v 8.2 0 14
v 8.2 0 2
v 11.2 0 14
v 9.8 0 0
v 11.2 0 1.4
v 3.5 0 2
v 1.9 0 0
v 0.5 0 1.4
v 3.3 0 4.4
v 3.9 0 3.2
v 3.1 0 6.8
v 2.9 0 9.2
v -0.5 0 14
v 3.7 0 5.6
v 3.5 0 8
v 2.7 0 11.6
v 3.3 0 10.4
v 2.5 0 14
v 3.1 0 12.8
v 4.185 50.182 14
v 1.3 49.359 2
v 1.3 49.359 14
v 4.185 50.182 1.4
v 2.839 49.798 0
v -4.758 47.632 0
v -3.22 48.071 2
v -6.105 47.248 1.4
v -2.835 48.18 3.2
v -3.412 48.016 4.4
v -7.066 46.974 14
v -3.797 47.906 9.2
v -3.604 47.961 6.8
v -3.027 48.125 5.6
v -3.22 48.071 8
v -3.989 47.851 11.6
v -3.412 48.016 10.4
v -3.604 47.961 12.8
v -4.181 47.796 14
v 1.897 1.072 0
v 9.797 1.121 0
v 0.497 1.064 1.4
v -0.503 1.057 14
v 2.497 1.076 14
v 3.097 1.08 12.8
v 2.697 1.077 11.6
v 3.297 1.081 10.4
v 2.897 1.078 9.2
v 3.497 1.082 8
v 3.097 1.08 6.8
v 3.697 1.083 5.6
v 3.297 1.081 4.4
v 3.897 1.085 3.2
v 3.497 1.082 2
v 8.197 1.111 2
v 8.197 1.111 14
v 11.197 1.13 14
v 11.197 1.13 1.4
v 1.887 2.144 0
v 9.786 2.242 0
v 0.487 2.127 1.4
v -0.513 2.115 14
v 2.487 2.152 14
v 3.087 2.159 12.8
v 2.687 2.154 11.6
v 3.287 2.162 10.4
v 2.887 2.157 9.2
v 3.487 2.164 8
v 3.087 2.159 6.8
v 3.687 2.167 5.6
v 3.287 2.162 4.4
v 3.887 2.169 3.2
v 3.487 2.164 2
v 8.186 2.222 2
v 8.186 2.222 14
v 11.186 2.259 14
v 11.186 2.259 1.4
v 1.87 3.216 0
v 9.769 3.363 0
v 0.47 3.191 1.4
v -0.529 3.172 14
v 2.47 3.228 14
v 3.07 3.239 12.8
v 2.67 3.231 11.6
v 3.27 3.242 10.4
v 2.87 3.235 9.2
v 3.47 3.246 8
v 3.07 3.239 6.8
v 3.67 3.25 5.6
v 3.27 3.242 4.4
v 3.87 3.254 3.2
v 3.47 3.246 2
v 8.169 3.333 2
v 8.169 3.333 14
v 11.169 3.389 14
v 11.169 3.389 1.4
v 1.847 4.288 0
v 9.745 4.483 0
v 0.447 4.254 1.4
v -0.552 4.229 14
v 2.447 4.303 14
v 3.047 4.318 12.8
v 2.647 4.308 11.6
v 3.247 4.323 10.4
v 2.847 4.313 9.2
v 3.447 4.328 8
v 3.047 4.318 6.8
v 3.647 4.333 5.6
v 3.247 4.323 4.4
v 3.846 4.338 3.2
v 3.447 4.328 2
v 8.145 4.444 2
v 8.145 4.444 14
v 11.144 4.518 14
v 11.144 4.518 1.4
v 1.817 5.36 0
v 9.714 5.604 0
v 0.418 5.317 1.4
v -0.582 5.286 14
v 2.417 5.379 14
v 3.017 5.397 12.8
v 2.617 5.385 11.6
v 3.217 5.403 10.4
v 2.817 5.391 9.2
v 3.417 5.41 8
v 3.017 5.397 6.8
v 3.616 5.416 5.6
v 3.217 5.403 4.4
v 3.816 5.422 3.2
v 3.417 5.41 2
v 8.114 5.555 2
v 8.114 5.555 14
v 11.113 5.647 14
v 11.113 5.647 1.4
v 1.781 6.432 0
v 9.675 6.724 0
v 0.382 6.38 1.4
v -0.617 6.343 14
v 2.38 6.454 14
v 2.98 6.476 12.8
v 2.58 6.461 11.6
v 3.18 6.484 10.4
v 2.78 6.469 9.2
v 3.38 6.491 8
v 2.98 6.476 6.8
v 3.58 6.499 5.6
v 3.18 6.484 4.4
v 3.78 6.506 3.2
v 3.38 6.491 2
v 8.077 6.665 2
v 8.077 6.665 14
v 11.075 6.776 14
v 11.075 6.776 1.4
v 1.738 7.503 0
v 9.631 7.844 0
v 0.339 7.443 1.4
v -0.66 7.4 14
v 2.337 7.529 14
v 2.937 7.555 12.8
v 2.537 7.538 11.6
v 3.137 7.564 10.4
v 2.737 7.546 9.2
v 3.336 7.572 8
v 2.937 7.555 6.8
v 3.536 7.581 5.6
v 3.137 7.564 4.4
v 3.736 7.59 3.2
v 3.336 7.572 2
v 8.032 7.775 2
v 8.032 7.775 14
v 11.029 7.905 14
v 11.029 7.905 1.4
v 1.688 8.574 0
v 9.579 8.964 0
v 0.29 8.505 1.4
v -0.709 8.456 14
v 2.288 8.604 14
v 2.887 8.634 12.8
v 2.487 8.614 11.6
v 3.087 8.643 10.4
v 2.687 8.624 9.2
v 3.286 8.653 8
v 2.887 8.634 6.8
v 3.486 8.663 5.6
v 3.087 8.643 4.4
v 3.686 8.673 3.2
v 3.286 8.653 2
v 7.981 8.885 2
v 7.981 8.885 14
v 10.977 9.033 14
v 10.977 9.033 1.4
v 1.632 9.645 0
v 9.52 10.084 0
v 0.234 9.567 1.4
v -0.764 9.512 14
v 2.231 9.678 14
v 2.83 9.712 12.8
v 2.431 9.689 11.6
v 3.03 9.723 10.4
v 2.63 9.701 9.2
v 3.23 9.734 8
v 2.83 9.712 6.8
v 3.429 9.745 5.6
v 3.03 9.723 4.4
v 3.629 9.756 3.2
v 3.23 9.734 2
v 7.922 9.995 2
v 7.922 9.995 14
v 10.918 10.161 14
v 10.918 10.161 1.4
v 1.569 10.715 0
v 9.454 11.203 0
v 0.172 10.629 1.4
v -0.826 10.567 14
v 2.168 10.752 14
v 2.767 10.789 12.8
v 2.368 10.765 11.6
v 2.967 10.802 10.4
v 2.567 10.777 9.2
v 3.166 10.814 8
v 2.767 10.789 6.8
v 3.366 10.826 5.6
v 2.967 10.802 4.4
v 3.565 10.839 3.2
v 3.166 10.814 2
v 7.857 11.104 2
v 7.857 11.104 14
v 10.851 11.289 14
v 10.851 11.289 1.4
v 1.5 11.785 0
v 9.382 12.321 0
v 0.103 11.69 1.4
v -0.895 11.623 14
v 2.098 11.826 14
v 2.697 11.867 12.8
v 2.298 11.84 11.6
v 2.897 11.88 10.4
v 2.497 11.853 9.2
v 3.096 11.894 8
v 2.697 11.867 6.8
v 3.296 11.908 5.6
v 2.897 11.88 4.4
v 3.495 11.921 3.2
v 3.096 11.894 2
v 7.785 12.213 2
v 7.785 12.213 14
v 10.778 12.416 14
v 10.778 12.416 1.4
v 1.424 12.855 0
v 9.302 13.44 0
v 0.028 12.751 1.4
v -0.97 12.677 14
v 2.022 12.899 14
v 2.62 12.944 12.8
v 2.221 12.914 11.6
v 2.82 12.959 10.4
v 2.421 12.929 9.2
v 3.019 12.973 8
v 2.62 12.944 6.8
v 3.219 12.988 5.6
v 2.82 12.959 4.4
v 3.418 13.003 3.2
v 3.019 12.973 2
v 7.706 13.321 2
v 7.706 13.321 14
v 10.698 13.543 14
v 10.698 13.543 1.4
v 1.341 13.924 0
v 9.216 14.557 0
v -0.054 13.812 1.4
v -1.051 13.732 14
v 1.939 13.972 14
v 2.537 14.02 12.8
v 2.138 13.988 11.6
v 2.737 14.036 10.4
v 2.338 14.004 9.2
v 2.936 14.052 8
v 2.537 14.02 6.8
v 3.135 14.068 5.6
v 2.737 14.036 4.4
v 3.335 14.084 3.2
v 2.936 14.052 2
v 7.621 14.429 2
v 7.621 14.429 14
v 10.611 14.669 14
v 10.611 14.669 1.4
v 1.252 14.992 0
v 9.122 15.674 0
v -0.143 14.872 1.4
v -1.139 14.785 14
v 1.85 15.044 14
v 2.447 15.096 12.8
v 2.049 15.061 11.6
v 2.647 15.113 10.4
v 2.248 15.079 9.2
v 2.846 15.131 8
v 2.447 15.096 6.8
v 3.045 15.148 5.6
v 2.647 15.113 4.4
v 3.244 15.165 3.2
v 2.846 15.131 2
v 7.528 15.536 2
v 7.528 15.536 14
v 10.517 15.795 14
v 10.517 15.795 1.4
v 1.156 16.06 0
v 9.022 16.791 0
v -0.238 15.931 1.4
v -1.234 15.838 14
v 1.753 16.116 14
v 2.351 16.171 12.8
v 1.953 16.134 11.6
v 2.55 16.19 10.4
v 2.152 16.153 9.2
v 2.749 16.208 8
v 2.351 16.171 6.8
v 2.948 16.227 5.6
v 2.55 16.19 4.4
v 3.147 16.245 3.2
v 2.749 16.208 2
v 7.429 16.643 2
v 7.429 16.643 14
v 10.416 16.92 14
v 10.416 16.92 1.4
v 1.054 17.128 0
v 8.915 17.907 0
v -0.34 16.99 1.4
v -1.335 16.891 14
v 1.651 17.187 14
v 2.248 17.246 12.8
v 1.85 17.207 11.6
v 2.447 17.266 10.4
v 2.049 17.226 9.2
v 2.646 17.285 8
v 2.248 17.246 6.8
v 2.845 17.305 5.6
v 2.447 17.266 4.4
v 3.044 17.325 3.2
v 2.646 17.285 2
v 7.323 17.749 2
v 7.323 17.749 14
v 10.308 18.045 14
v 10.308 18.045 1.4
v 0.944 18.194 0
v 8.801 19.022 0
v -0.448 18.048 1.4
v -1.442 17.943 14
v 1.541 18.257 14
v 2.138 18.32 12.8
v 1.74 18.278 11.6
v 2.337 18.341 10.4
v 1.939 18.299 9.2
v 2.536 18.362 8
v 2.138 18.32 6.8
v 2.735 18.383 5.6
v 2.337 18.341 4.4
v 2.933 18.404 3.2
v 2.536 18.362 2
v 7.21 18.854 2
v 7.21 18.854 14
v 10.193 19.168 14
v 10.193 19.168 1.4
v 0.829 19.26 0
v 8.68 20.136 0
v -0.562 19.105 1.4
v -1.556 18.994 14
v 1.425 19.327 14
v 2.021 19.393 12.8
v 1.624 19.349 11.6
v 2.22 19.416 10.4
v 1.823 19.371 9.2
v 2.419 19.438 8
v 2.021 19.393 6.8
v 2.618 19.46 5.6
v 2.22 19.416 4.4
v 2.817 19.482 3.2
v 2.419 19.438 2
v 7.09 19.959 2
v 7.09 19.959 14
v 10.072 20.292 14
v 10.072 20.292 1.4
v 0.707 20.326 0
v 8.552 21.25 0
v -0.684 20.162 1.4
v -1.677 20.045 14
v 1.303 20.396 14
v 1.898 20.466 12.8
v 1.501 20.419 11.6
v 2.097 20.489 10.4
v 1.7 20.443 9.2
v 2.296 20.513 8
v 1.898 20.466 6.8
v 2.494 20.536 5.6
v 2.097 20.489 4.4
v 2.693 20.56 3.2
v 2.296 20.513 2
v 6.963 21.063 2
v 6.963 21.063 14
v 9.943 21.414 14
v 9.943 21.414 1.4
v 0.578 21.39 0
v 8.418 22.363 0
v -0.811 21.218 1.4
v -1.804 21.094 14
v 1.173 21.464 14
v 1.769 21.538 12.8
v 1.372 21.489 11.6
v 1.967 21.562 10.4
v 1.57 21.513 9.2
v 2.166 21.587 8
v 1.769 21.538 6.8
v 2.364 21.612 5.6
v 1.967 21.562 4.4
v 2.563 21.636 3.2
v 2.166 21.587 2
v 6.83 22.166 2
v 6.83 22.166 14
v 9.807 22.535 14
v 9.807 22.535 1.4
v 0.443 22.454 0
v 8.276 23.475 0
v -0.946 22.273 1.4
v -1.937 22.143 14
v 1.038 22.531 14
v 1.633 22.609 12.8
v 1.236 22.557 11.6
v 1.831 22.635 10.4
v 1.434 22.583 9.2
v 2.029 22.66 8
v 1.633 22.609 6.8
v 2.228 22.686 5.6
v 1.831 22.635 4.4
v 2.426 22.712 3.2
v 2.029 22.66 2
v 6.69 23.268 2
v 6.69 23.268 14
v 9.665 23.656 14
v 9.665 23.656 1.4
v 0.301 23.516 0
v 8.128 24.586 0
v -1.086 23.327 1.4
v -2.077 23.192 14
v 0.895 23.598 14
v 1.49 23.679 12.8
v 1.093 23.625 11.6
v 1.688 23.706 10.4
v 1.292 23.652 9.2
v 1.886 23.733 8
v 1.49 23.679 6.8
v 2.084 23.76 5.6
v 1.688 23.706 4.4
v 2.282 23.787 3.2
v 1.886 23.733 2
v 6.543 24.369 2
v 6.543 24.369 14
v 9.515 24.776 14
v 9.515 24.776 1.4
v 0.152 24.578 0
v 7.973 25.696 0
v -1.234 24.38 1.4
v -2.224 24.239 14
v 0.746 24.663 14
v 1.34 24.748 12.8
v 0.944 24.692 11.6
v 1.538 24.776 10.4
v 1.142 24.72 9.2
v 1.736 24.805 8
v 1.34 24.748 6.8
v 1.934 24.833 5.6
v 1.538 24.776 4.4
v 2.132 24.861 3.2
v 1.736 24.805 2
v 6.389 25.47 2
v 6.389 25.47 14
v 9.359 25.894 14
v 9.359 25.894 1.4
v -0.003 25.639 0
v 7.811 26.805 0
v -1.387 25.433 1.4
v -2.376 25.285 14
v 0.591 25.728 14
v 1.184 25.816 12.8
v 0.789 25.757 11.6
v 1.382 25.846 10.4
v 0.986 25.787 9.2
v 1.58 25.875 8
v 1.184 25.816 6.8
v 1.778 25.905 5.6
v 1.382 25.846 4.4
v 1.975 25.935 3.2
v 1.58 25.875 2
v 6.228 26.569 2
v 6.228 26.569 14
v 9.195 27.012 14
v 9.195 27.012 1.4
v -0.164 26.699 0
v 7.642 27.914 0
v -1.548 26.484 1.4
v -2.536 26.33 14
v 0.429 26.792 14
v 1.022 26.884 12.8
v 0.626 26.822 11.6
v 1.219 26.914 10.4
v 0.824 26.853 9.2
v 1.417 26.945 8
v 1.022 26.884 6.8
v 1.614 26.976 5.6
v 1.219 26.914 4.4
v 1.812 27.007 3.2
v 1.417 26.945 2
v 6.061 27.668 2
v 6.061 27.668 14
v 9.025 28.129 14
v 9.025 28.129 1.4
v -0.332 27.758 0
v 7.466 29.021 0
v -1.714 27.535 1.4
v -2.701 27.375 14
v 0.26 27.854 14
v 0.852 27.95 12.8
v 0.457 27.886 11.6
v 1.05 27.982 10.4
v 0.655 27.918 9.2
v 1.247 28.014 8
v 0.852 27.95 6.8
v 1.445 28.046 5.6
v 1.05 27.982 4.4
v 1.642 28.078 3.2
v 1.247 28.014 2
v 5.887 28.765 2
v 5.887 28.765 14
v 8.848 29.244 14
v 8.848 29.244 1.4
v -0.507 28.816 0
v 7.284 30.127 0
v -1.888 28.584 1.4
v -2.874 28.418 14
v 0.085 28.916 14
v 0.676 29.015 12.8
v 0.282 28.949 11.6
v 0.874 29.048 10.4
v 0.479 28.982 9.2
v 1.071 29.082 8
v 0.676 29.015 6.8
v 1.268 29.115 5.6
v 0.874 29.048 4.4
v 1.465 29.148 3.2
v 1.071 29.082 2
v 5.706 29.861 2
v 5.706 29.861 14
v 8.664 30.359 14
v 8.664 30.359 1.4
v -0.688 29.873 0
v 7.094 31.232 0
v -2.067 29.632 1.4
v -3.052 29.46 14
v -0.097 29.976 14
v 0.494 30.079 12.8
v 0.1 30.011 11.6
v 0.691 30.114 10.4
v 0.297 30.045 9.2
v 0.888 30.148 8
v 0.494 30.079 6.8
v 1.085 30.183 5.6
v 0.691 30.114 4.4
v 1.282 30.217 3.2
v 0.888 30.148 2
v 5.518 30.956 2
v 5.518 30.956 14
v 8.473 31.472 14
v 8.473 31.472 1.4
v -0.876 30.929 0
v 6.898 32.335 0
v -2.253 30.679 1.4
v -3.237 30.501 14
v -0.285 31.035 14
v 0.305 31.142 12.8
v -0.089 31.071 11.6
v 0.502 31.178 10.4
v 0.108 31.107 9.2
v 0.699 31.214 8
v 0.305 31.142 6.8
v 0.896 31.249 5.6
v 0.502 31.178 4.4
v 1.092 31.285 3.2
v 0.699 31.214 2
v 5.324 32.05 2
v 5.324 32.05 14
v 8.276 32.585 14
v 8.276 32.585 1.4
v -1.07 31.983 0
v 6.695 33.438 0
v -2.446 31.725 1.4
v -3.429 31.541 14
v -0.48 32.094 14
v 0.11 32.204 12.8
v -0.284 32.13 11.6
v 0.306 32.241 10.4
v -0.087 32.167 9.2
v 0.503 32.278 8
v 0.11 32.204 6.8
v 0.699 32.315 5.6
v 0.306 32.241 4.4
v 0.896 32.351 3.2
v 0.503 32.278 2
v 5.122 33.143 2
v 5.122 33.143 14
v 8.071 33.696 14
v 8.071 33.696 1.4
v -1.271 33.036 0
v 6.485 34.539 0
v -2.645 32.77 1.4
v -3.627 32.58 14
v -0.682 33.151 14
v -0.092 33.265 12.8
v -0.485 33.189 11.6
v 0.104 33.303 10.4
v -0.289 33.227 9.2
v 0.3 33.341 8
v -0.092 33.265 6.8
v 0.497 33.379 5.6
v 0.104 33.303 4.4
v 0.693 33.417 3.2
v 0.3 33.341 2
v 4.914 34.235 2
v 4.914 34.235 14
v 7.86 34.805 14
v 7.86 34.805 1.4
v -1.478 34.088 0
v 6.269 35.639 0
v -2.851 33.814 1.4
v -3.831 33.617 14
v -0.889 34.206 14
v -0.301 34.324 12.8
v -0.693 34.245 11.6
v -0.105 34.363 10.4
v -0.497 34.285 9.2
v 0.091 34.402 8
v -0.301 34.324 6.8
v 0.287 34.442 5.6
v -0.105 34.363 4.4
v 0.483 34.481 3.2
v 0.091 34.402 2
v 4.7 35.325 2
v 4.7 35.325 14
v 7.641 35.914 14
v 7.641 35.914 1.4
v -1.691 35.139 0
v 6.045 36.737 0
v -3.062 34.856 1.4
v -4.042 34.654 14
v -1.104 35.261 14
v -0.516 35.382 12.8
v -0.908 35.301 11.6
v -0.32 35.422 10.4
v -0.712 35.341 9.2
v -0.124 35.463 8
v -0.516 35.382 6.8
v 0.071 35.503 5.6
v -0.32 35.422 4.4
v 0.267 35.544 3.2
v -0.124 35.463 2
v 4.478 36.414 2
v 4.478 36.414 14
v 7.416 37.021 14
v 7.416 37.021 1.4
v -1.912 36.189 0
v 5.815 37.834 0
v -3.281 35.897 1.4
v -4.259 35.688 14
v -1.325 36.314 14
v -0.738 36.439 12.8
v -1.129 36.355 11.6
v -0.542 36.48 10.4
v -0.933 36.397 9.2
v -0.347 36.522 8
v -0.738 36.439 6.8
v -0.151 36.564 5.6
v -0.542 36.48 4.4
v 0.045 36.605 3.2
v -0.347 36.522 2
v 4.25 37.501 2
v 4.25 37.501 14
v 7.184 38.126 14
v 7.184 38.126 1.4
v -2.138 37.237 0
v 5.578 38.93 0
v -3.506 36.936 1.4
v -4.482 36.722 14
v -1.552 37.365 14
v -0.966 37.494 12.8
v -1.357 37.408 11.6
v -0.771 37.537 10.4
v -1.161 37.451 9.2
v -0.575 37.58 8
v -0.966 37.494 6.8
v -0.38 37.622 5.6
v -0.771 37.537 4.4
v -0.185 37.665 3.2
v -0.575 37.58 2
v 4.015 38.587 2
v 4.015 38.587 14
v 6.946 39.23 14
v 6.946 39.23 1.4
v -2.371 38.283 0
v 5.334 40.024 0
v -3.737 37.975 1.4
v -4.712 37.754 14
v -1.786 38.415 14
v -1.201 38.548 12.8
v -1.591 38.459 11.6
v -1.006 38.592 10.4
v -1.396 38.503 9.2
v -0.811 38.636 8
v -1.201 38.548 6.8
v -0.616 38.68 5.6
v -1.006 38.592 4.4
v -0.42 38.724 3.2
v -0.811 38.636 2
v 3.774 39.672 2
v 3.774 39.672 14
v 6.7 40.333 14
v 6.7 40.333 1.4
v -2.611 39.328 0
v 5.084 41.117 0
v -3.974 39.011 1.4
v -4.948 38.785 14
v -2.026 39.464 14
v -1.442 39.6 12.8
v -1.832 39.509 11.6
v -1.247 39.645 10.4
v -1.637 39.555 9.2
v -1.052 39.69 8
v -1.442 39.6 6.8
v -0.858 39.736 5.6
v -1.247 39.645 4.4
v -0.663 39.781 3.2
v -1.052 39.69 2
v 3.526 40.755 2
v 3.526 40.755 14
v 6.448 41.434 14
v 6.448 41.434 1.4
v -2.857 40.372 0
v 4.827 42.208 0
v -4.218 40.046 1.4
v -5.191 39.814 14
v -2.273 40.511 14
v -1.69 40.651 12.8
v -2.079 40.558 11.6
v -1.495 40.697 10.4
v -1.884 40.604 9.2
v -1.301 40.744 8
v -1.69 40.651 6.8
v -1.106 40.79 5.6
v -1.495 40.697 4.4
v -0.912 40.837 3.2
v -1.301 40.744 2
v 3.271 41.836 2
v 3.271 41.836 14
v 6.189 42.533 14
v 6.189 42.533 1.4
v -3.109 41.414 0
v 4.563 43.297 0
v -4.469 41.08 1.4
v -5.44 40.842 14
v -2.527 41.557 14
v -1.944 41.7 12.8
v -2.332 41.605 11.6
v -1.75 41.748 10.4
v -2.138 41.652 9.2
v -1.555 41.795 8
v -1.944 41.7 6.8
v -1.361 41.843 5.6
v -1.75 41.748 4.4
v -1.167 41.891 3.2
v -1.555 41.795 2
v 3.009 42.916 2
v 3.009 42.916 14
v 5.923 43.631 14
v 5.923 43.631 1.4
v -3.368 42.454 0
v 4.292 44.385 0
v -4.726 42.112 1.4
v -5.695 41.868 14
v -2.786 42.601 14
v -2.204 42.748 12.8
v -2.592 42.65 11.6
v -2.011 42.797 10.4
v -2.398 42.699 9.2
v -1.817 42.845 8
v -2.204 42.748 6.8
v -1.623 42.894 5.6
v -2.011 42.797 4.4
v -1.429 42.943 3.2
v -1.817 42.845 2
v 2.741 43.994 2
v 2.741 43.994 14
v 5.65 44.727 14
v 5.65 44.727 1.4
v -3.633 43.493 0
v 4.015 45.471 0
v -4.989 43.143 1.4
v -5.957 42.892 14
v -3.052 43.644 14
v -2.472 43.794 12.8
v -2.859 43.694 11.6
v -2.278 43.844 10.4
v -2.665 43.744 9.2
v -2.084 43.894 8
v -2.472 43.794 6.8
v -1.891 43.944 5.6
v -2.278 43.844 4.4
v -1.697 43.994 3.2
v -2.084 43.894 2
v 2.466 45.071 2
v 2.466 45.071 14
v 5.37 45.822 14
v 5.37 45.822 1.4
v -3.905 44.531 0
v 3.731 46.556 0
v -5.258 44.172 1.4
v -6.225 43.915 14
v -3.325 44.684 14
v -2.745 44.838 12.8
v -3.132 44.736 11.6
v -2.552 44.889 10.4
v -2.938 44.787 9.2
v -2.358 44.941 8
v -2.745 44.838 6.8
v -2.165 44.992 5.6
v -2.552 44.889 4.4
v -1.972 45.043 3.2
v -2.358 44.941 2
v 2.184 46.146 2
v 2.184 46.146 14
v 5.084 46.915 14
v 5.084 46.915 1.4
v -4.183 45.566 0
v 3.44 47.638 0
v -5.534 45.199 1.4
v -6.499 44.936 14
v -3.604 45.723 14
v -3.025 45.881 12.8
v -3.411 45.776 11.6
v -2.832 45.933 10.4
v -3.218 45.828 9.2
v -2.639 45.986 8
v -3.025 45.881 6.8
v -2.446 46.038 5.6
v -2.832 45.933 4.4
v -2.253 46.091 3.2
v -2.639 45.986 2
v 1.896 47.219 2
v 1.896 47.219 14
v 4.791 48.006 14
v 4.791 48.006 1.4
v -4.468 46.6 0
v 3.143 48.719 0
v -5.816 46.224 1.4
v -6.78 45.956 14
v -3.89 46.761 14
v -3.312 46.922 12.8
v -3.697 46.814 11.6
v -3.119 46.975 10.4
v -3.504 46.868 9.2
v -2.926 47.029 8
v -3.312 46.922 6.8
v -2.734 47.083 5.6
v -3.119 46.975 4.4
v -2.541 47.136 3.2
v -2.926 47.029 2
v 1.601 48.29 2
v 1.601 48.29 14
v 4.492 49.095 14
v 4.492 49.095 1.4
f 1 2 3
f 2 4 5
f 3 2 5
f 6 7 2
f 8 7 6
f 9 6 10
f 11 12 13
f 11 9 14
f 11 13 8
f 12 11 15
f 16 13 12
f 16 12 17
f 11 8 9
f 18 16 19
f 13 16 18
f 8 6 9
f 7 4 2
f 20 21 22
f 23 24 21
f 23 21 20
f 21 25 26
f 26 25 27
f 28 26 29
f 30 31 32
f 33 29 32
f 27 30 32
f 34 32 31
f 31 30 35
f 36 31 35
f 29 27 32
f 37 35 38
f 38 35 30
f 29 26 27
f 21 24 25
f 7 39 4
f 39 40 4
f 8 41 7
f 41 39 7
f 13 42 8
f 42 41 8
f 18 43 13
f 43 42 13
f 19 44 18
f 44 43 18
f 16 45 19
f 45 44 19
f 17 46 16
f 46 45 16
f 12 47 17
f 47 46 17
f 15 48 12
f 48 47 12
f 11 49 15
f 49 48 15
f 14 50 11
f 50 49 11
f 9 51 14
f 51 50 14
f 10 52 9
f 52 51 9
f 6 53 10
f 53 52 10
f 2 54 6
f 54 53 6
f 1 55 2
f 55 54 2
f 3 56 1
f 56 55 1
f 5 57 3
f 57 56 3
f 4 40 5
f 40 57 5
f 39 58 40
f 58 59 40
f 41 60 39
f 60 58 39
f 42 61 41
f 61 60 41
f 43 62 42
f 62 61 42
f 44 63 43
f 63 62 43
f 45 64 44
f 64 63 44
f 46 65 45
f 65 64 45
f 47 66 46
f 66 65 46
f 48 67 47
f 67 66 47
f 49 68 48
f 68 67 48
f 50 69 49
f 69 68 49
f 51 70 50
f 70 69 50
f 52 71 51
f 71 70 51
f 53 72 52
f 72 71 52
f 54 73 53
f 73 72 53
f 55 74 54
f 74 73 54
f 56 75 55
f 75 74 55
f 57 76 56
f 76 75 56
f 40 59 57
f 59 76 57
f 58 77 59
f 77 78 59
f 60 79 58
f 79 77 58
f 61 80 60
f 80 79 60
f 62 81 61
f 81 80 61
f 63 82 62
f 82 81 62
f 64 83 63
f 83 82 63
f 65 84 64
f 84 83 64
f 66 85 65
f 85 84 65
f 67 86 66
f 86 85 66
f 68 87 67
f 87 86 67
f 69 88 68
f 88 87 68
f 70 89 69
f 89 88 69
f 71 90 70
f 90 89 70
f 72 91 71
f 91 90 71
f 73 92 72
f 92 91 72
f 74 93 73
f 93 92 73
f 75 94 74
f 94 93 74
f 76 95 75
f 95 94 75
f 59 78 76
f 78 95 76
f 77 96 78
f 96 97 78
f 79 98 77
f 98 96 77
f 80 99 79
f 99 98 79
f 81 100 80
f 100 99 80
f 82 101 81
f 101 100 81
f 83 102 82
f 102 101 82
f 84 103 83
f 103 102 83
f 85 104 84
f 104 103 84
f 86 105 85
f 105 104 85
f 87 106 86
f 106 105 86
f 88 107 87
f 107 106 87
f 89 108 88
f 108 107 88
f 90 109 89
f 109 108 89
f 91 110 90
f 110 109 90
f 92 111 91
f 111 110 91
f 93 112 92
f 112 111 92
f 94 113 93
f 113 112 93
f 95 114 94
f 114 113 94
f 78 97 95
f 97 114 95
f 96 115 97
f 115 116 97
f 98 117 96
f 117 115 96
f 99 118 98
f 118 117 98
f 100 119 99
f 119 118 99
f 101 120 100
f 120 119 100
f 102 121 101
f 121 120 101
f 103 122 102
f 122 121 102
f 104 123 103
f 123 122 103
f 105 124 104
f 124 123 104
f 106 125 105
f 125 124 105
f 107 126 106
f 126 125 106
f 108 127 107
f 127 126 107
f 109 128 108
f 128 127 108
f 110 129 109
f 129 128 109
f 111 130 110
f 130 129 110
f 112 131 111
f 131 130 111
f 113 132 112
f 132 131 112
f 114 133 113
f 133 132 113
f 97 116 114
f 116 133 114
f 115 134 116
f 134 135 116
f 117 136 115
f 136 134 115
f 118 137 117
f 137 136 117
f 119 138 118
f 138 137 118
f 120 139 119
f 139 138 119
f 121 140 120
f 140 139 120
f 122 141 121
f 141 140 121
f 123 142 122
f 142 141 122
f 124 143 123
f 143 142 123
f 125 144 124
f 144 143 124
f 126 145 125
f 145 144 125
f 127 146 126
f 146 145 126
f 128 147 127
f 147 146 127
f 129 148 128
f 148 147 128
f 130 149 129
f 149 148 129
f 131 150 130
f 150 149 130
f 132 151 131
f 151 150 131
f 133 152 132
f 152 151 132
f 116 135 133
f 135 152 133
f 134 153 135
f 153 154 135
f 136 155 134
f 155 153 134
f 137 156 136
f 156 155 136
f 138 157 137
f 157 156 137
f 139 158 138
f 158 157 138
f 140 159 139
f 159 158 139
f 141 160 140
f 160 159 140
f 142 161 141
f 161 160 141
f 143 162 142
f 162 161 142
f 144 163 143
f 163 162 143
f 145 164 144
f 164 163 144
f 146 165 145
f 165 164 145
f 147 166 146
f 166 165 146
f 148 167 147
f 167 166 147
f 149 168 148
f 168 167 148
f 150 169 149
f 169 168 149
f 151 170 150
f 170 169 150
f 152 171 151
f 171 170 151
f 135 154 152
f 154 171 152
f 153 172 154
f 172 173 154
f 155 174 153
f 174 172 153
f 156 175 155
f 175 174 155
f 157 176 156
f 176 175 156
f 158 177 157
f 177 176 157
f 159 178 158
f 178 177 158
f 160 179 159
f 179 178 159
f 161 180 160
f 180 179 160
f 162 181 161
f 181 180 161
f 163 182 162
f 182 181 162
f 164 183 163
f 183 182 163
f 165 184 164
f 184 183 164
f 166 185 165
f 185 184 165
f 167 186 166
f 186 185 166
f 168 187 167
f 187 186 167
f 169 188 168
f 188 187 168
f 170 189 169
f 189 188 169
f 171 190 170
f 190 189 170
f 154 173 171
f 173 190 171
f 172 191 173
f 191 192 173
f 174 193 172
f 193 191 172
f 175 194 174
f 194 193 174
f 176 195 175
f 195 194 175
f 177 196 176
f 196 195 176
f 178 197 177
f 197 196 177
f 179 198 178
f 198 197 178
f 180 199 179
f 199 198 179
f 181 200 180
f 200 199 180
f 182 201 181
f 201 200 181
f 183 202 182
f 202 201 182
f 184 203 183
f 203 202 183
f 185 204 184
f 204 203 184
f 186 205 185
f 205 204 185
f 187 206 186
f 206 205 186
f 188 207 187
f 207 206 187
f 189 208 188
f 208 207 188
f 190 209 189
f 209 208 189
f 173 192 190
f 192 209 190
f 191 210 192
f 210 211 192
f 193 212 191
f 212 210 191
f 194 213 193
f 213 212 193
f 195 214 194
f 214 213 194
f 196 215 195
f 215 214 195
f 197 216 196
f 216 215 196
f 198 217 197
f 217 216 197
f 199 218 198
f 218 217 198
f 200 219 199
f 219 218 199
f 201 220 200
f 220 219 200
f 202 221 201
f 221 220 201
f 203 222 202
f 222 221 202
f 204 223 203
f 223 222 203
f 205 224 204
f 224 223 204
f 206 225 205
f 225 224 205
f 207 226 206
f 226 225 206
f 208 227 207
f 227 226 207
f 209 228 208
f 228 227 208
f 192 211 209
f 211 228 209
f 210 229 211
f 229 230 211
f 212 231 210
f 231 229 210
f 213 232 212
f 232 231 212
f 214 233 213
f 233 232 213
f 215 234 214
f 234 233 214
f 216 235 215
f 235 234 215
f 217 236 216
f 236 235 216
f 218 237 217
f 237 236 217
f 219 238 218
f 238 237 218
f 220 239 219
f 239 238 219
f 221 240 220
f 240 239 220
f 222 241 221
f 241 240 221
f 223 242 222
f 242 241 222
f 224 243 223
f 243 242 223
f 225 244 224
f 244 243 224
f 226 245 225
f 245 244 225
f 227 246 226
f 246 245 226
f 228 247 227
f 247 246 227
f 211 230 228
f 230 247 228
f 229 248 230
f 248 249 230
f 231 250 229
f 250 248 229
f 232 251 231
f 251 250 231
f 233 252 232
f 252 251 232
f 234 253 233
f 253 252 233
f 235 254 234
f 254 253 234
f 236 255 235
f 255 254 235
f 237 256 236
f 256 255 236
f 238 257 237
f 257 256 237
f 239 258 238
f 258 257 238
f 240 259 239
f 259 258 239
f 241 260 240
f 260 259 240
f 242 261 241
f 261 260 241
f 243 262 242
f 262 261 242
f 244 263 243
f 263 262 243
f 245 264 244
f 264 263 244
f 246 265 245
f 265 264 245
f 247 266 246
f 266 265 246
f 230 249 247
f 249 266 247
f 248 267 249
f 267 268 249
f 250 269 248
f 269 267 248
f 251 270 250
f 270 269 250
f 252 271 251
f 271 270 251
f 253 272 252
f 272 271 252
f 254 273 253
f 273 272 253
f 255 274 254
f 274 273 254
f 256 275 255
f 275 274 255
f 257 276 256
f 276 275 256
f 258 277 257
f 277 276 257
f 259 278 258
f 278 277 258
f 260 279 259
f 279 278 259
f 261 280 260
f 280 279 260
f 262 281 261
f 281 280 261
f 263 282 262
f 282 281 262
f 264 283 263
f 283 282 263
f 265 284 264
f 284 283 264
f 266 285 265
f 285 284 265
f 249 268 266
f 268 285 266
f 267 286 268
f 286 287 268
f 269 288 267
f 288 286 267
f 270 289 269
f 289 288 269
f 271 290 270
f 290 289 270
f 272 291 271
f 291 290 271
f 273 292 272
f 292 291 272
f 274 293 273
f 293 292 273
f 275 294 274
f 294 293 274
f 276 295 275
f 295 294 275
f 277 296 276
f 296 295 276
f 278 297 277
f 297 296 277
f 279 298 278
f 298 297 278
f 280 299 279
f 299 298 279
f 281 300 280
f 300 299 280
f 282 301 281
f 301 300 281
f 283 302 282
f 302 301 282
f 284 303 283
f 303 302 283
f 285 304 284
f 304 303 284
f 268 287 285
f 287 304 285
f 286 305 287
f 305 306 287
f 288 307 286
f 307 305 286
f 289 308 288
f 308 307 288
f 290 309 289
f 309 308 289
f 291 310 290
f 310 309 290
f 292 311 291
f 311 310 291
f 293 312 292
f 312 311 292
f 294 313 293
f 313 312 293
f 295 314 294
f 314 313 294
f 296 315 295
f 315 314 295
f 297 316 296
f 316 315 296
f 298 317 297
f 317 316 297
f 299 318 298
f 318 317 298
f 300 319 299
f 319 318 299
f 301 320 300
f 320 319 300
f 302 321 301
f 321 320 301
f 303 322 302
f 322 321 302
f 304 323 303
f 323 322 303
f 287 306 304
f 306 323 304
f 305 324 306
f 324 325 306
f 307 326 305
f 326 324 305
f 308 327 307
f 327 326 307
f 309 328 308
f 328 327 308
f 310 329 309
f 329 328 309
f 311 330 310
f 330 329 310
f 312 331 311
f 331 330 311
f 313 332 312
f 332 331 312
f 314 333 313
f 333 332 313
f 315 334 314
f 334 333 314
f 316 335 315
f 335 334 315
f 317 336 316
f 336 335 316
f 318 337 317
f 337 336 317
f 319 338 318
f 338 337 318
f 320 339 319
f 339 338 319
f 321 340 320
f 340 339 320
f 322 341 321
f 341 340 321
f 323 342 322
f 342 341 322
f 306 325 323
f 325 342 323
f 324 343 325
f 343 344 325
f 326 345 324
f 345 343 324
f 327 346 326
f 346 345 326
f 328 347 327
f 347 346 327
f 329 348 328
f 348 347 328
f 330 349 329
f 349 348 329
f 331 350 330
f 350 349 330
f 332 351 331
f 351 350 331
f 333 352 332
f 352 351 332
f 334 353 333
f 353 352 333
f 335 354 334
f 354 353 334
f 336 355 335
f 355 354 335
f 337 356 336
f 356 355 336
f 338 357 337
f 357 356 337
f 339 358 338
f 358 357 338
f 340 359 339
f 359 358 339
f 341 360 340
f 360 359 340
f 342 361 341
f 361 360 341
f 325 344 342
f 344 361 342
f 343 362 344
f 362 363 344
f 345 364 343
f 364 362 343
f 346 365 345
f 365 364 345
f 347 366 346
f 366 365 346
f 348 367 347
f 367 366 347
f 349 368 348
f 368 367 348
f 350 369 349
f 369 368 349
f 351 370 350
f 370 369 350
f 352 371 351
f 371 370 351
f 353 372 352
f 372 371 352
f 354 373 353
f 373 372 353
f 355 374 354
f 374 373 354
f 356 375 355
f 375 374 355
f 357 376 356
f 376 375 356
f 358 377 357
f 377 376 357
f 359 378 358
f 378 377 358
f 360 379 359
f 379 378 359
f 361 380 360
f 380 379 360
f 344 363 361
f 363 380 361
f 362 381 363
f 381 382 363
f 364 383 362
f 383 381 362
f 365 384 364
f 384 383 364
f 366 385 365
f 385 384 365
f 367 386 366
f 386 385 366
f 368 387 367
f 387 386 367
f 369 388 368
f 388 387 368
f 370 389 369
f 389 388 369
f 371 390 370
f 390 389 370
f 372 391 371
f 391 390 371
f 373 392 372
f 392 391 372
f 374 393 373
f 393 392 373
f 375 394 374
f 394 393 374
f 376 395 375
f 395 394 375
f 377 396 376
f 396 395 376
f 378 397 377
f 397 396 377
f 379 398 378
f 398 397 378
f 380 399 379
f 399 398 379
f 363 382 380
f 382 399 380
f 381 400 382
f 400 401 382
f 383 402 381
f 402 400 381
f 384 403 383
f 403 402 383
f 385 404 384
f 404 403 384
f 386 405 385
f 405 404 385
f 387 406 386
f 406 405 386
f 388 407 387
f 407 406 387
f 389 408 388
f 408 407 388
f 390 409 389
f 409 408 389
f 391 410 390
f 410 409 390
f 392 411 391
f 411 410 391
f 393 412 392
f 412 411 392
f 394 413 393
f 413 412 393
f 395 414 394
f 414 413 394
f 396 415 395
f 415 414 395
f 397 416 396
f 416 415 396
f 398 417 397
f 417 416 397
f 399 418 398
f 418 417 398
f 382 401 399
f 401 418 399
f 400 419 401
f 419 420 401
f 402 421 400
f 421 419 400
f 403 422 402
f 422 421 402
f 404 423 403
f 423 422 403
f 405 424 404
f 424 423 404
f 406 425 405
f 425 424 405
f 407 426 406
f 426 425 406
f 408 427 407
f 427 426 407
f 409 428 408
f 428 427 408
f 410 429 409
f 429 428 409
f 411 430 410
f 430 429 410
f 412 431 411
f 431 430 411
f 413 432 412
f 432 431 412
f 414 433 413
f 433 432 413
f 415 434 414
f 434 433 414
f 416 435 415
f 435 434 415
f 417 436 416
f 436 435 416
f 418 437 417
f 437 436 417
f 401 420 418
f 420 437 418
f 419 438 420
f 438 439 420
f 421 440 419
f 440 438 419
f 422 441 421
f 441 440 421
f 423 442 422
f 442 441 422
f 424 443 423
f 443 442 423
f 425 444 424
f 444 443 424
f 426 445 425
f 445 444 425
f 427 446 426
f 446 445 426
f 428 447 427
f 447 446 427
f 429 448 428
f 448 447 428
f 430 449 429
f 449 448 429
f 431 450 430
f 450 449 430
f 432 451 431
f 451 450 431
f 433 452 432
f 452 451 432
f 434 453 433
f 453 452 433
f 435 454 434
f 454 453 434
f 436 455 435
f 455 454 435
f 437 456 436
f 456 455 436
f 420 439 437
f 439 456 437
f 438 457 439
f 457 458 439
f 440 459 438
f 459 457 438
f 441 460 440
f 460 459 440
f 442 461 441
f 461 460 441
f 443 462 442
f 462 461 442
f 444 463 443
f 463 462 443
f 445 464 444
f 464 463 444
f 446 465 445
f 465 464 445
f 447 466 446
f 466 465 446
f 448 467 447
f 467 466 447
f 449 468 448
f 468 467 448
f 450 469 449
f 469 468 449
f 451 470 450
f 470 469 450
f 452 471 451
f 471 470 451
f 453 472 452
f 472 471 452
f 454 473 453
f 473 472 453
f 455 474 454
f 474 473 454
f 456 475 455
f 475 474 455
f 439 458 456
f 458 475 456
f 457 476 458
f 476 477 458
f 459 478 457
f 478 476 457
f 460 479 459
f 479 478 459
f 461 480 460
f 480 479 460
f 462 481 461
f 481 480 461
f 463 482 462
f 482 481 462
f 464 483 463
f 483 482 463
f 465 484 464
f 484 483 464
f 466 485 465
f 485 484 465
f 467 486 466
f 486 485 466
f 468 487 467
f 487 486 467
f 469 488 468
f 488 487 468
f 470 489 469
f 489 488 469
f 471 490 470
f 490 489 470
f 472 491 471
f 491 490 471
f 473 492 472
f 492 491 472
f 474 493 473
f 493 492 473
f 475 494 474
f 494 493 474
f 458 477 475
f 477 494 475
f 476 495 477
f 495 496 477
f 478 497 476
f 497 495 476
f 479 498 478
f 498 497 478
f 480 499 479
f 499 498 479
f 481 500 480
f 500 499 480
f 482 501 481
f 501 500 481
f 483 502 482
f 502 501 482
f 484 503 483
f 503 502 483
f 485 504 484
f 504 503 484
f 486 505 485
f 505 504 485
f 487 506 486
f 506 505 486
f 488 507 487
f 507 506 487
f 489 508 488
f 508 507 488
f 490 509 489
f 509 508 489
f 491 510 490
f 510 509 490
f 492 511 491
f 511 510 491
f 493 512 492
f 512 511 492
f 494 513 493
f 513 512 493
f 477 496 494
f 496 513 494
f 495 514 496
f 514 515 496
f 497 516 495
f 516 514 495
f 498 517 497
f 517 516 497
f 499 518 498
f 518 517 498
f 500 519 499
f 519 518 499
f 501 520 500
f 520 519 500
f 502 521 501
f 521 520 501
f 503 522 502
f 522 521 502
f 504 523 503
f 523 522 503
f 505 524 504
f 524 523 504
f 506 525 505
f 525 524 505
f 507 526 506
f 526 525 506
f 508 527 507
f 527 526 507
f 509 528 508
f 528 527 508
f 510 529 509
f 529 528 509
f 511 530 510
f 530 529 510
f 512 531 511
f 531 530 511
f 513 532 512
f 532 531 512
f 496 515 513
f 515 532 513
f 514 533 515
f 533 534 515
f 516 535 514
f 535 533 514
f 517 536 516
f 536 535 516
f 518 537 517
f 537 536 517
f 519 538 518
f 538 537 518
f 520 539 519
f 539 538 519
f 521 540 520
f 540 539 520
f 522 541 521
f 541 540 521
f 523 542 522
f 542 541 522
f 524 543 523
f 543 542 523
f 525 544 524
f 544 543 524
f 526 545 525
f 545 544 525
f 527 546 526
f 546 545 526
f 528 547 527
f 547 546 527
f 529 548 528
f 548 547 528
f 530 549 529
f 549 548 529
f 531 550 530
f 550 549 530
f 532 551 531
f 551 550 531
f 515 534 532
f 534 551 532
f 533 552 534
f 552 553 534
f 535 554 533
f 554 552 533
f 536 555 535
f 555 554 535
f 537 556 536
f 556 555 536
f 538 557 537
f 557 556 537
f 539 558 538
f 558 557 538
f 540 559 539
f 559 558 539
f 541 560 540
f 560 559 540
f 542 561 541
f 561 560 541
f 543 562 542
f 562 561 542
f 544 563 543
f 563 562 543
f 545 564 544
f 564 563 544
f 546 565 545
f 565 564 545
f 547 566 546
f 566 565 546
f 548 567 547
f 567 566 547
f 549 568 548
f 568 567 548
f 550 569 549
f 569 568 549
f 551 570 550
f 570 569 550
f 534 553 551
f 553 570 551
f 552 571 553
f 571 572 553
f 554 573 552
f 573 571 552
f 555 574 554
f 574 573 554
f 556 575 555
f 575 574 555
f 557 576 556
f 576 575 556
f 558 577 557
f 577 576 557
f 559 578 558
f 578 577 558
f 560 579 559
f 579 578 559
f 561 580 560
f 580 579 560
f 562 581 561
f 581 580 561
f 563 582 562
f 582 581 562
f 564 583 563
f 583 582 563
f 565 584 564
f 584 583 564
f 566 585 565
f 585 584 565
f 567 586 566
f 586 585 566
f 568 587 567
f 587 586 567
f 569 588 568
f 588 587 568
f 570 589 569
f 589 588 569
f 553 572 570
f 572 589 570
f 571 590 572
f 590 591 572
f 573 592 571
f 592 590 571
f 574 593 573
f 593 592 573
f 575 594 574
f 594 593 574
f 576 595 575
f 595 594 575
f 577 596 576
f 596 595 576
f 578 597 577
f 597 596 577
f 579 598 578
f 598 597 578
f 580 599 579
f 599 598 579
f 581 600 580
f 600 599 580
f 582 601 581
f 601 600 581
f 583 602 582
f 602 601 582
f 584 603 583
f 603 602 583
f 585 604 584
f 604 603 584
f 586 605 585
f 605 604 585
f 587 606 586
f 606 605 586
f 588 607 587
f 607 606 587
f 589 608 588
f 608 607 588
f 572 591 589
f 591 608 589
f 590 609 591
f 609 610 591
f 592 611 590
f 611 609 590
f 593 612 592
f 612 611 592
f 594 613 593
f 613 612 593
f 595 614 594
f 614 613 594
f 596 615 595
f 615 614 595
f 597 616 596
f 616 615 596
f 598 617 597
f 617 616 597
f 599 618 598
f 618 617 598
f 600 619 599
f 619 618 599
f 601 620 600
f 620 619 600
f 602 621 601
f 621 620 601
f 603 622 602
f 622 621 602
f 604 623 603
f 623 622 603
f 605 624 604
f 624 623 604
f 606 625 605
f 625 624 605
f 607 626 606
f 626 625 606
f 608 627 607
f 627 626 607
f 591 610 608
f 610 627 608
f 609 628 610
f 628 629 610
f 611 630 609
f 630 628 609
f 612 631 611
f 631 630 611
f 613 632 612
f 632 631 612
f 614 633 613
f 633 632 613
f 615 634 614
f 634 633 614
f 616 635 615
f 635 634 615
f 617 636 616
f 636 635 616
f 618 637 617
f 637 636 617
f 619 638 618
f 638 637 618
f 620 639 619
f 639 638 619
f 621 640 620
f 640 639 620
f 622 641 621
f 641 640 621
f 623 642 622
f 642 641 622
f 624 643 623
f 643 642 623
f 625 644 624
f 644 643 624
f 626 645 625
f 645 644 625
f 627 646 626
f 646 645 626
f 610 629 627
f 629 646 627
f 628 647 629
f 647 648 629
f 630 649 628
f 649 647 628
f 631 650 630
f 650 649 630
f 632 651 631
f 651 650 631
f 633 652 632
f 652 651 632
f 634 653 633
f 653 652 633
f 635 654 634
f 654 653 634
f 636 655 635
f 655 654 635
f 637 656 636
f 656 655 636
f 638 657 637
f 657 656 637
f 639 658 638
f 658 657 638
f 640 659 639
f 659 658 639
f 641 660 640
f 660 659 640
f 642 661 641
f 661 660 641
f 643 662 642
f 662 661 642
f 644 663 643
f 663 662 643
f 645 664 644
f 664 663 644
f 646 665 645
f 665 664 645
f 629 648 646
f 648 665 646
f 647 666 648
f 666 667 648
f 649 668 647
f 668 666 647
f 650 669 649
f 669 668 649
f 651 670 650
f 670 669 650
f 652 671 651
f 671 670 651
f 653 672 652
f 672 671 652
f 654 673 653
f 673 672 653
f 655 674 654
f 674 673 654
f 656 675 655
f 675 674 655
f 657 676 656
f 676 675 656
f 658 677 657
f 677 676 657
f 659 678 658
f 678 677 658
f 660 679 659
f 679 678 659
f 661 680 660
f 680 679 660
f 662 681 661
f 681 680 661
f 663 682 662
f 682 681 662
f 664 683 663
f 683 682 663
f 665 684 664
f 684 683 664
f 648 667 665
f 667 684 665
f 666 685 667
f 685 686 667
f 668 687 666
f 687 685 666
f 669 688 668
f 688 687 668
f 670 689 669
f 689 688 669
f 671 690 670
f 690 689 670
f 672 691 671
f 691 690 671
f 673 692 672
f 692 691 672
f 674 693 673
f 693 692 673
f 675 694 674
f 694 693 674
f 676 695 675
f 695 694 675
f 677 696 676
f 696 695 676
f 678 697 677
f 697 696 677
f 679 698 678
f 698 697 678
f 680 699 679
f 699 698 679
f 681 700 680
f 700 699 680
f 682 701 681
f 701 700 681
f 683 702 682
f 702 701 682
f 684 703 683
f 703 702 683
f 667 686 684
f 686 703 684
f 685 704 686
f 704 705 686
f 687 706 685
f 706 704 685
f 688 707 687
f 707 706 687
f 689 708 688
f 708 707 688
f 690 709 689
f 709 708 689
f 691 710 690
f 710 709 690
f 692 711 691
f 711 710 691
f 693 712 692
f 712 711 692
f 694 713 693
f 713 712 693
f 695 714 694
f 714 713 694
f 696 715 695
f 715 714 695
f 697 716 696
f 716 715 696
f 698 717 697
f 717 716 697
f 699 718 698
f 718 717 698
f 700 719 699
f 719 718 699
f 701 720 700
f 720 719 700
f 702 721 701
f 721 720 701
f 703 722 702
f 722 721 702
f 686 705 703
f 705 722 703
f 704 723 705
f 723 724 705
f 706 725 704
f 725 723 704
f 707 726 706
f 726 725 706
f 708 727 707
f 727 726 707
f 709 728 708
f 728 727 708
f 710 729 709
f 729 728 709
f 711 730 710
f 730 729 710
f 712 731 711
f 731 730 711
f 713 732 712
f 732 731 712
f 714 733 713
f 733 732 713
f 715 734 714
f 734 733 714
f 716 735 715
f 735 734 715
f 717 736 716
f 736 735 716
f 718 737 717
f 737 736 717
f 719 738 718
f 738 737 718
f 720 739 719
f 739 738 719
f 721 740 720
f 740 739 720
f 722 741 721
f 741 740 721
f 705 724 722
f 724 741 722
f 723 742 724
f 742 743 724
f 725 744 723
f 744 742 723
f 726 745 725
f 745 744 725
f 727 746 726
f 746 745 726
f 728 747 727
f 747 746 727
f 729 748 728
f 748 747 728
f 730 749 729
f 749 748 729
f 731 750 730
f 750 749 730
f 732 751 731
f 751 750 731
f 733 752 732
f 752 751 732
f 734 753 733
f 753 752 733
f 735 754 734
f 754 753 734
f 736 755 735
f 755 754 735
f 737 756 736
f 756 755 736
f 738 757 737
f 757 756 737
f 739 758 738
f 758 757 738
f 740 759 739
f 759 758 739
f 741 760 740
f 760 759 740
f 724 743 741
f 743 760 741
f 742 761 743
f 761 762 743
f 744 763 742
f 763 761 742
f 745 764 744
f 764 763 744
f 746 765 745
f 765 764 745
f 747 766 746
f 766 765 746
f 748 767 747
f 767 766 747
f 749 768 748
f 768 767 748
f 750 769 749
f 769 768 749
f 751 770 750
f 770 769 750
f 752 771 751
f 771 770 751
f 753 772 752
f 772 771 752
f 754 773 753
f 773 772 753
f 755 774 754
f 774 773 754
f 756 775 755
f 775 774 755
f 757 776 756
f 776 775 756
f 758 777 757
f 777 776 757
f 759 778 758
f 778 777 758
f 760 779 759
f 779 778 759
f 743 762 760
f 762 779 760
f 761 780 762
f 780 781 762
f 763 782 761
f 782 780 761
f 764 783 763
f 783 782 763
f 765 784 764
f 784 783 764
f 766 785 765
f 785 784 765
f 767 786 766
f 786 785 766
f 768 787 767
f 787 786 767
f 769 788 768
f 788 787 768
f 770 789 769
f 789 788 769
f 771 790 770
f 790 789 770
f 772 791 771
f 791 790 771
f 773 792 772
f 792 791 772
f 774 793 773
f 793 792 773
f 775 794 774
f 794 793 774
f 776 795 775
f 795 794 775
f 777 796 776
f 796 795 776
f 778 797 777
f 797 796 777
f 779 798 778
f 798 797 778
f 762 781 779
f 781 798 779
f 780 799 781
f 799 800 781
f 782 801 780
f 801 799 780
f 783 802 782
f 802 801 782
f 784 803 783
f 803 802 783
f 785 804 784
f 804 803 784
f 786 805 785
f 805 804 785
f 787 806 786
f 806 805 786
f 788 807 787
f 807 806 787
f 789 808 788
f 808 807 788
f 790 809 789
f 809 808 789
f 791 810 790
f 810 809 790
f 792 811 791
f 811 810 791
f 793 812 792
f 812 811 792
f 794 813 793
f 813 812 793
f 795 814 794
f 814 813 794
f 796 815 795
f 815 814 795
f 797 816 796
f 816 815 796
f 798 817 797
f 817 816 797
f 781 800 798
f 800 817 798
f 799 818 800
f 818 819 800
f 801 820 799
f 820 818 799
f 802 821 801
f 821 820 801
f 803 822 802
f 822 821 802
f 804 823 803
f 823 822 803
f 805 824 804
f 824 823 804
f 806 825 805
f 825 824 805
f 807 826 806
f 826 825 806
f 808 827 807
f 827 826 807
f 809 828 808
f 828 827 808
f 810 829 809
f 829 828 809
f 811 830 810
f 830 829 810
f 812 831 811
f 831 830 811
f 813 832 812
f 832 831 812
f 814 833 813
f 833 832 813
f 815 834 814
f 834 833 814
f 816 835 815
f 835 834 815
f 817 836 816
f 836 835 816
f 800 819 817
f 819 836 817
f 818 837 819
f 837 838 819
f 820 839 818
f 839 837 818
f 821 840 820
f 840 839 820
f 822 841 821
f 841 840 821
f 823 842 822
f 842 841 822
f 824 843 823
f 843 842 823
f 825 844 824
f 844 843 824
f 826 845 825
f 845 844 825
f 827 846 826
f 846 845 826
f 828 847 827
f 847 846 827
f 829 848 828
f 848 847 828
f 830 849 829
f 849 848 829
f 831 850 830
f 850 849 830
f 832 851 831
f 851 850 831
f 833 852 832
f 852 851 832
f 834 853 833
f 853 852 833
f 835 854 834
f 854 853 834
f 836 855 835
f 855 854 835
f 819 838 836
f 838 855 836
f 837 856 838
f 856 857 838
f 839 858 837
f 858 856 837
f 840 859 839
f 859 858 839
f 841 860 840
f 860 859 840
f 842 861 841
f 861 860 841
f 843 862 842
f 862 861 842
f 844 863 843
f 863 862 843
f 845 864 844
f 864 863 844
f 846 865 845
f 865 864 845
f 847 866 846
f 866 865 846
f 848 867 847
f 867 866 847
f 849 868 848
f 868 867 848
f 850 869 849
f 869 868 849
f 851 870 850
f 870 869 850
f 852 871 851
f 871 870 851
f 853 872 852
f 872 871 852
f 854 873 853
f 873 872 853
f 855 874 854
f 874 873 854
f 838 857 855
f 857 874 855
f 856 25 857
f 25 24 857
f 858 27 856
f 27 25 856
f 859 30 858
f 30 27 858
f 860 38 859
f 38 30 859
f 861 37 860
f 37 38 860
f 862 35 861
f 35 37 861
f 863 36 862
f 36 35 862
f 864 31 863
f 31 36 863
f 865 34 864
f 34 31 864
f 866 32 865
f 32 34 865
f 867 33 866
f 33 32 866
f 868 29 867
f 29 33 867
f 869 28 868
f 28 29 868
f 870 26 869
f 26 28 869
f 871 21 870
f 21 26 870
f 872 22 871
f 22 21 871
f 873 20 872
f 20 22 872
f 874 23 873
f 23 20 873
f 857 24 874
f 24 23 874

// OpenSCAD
$fn = 1024;

seat_r = 180;
upper_w = 5.2;
lower_w = 4.2;
clip_h = 14;
clip_bottom_w = 2;
clip_side_w = 3;
clip_l = 50;
bevel = 1.4;

teeth_overlap = 0.5;
teeth_count = 5;

angle = 360 / (2 * seat_r * PI / clip_l);

translate([-seat_r + upper_w + clip_side_w, 0, clip_h])
rotate_extrude(angle = angle)
    translate([seat_r + clip_side_w, 0, 0])
        rotate([180, 0, - 90])
            clip_profile();

module clip_profile() {
    outer_x = clip_h;
    inner_x = clip_h - clip_bottom_w;
    outer_lower_y = lower_w + 2 * clip_side_w + teeth_overlap;
    outer_upper_y = upper_w + 2 * clip_side_w + teeth_overlap;

    outer_points = [[0, 0], [outer_x - bevel, 0], [outer_x, bevel], [outer_x, outer_lower_y - bevel], [outer_x - bevel, outer_lower_y], [0, outer_upper_y]];
    remaining_inner_points = [[inner_x, outer_lower_y - clip_side_w], [inner_x, clip_side_w], [0, clip_side_w]];

    teeth_step_x = inner_x / teeth_count;
    teeth_step_y = (upper_w - lower_w) / teeth_count;
    start_x = 0;
    start_y = outer_upper_y - clip_side_w;

    function teeth_top(i) = [start_x + i * teeth_step_x / 2, start_y - i * teeth_step_y / 2 - teeth_overlap];
    function teeth_end(i) = [start_x + i * teeth_step_x / 2, start_y - i * teeth_step_y / 2];

    teeth_start_points = [[0, outer_upper_y - clip_side_w]];
    teeth_points = [for (i = [1:teeth_count * 2]) if (i % 2 == 0) teeth_end(i) else teeth_top(i)];

    polygon(points = concat(outer_points, teeth_start_points, teeth_points, remaining_inner_points));
}
